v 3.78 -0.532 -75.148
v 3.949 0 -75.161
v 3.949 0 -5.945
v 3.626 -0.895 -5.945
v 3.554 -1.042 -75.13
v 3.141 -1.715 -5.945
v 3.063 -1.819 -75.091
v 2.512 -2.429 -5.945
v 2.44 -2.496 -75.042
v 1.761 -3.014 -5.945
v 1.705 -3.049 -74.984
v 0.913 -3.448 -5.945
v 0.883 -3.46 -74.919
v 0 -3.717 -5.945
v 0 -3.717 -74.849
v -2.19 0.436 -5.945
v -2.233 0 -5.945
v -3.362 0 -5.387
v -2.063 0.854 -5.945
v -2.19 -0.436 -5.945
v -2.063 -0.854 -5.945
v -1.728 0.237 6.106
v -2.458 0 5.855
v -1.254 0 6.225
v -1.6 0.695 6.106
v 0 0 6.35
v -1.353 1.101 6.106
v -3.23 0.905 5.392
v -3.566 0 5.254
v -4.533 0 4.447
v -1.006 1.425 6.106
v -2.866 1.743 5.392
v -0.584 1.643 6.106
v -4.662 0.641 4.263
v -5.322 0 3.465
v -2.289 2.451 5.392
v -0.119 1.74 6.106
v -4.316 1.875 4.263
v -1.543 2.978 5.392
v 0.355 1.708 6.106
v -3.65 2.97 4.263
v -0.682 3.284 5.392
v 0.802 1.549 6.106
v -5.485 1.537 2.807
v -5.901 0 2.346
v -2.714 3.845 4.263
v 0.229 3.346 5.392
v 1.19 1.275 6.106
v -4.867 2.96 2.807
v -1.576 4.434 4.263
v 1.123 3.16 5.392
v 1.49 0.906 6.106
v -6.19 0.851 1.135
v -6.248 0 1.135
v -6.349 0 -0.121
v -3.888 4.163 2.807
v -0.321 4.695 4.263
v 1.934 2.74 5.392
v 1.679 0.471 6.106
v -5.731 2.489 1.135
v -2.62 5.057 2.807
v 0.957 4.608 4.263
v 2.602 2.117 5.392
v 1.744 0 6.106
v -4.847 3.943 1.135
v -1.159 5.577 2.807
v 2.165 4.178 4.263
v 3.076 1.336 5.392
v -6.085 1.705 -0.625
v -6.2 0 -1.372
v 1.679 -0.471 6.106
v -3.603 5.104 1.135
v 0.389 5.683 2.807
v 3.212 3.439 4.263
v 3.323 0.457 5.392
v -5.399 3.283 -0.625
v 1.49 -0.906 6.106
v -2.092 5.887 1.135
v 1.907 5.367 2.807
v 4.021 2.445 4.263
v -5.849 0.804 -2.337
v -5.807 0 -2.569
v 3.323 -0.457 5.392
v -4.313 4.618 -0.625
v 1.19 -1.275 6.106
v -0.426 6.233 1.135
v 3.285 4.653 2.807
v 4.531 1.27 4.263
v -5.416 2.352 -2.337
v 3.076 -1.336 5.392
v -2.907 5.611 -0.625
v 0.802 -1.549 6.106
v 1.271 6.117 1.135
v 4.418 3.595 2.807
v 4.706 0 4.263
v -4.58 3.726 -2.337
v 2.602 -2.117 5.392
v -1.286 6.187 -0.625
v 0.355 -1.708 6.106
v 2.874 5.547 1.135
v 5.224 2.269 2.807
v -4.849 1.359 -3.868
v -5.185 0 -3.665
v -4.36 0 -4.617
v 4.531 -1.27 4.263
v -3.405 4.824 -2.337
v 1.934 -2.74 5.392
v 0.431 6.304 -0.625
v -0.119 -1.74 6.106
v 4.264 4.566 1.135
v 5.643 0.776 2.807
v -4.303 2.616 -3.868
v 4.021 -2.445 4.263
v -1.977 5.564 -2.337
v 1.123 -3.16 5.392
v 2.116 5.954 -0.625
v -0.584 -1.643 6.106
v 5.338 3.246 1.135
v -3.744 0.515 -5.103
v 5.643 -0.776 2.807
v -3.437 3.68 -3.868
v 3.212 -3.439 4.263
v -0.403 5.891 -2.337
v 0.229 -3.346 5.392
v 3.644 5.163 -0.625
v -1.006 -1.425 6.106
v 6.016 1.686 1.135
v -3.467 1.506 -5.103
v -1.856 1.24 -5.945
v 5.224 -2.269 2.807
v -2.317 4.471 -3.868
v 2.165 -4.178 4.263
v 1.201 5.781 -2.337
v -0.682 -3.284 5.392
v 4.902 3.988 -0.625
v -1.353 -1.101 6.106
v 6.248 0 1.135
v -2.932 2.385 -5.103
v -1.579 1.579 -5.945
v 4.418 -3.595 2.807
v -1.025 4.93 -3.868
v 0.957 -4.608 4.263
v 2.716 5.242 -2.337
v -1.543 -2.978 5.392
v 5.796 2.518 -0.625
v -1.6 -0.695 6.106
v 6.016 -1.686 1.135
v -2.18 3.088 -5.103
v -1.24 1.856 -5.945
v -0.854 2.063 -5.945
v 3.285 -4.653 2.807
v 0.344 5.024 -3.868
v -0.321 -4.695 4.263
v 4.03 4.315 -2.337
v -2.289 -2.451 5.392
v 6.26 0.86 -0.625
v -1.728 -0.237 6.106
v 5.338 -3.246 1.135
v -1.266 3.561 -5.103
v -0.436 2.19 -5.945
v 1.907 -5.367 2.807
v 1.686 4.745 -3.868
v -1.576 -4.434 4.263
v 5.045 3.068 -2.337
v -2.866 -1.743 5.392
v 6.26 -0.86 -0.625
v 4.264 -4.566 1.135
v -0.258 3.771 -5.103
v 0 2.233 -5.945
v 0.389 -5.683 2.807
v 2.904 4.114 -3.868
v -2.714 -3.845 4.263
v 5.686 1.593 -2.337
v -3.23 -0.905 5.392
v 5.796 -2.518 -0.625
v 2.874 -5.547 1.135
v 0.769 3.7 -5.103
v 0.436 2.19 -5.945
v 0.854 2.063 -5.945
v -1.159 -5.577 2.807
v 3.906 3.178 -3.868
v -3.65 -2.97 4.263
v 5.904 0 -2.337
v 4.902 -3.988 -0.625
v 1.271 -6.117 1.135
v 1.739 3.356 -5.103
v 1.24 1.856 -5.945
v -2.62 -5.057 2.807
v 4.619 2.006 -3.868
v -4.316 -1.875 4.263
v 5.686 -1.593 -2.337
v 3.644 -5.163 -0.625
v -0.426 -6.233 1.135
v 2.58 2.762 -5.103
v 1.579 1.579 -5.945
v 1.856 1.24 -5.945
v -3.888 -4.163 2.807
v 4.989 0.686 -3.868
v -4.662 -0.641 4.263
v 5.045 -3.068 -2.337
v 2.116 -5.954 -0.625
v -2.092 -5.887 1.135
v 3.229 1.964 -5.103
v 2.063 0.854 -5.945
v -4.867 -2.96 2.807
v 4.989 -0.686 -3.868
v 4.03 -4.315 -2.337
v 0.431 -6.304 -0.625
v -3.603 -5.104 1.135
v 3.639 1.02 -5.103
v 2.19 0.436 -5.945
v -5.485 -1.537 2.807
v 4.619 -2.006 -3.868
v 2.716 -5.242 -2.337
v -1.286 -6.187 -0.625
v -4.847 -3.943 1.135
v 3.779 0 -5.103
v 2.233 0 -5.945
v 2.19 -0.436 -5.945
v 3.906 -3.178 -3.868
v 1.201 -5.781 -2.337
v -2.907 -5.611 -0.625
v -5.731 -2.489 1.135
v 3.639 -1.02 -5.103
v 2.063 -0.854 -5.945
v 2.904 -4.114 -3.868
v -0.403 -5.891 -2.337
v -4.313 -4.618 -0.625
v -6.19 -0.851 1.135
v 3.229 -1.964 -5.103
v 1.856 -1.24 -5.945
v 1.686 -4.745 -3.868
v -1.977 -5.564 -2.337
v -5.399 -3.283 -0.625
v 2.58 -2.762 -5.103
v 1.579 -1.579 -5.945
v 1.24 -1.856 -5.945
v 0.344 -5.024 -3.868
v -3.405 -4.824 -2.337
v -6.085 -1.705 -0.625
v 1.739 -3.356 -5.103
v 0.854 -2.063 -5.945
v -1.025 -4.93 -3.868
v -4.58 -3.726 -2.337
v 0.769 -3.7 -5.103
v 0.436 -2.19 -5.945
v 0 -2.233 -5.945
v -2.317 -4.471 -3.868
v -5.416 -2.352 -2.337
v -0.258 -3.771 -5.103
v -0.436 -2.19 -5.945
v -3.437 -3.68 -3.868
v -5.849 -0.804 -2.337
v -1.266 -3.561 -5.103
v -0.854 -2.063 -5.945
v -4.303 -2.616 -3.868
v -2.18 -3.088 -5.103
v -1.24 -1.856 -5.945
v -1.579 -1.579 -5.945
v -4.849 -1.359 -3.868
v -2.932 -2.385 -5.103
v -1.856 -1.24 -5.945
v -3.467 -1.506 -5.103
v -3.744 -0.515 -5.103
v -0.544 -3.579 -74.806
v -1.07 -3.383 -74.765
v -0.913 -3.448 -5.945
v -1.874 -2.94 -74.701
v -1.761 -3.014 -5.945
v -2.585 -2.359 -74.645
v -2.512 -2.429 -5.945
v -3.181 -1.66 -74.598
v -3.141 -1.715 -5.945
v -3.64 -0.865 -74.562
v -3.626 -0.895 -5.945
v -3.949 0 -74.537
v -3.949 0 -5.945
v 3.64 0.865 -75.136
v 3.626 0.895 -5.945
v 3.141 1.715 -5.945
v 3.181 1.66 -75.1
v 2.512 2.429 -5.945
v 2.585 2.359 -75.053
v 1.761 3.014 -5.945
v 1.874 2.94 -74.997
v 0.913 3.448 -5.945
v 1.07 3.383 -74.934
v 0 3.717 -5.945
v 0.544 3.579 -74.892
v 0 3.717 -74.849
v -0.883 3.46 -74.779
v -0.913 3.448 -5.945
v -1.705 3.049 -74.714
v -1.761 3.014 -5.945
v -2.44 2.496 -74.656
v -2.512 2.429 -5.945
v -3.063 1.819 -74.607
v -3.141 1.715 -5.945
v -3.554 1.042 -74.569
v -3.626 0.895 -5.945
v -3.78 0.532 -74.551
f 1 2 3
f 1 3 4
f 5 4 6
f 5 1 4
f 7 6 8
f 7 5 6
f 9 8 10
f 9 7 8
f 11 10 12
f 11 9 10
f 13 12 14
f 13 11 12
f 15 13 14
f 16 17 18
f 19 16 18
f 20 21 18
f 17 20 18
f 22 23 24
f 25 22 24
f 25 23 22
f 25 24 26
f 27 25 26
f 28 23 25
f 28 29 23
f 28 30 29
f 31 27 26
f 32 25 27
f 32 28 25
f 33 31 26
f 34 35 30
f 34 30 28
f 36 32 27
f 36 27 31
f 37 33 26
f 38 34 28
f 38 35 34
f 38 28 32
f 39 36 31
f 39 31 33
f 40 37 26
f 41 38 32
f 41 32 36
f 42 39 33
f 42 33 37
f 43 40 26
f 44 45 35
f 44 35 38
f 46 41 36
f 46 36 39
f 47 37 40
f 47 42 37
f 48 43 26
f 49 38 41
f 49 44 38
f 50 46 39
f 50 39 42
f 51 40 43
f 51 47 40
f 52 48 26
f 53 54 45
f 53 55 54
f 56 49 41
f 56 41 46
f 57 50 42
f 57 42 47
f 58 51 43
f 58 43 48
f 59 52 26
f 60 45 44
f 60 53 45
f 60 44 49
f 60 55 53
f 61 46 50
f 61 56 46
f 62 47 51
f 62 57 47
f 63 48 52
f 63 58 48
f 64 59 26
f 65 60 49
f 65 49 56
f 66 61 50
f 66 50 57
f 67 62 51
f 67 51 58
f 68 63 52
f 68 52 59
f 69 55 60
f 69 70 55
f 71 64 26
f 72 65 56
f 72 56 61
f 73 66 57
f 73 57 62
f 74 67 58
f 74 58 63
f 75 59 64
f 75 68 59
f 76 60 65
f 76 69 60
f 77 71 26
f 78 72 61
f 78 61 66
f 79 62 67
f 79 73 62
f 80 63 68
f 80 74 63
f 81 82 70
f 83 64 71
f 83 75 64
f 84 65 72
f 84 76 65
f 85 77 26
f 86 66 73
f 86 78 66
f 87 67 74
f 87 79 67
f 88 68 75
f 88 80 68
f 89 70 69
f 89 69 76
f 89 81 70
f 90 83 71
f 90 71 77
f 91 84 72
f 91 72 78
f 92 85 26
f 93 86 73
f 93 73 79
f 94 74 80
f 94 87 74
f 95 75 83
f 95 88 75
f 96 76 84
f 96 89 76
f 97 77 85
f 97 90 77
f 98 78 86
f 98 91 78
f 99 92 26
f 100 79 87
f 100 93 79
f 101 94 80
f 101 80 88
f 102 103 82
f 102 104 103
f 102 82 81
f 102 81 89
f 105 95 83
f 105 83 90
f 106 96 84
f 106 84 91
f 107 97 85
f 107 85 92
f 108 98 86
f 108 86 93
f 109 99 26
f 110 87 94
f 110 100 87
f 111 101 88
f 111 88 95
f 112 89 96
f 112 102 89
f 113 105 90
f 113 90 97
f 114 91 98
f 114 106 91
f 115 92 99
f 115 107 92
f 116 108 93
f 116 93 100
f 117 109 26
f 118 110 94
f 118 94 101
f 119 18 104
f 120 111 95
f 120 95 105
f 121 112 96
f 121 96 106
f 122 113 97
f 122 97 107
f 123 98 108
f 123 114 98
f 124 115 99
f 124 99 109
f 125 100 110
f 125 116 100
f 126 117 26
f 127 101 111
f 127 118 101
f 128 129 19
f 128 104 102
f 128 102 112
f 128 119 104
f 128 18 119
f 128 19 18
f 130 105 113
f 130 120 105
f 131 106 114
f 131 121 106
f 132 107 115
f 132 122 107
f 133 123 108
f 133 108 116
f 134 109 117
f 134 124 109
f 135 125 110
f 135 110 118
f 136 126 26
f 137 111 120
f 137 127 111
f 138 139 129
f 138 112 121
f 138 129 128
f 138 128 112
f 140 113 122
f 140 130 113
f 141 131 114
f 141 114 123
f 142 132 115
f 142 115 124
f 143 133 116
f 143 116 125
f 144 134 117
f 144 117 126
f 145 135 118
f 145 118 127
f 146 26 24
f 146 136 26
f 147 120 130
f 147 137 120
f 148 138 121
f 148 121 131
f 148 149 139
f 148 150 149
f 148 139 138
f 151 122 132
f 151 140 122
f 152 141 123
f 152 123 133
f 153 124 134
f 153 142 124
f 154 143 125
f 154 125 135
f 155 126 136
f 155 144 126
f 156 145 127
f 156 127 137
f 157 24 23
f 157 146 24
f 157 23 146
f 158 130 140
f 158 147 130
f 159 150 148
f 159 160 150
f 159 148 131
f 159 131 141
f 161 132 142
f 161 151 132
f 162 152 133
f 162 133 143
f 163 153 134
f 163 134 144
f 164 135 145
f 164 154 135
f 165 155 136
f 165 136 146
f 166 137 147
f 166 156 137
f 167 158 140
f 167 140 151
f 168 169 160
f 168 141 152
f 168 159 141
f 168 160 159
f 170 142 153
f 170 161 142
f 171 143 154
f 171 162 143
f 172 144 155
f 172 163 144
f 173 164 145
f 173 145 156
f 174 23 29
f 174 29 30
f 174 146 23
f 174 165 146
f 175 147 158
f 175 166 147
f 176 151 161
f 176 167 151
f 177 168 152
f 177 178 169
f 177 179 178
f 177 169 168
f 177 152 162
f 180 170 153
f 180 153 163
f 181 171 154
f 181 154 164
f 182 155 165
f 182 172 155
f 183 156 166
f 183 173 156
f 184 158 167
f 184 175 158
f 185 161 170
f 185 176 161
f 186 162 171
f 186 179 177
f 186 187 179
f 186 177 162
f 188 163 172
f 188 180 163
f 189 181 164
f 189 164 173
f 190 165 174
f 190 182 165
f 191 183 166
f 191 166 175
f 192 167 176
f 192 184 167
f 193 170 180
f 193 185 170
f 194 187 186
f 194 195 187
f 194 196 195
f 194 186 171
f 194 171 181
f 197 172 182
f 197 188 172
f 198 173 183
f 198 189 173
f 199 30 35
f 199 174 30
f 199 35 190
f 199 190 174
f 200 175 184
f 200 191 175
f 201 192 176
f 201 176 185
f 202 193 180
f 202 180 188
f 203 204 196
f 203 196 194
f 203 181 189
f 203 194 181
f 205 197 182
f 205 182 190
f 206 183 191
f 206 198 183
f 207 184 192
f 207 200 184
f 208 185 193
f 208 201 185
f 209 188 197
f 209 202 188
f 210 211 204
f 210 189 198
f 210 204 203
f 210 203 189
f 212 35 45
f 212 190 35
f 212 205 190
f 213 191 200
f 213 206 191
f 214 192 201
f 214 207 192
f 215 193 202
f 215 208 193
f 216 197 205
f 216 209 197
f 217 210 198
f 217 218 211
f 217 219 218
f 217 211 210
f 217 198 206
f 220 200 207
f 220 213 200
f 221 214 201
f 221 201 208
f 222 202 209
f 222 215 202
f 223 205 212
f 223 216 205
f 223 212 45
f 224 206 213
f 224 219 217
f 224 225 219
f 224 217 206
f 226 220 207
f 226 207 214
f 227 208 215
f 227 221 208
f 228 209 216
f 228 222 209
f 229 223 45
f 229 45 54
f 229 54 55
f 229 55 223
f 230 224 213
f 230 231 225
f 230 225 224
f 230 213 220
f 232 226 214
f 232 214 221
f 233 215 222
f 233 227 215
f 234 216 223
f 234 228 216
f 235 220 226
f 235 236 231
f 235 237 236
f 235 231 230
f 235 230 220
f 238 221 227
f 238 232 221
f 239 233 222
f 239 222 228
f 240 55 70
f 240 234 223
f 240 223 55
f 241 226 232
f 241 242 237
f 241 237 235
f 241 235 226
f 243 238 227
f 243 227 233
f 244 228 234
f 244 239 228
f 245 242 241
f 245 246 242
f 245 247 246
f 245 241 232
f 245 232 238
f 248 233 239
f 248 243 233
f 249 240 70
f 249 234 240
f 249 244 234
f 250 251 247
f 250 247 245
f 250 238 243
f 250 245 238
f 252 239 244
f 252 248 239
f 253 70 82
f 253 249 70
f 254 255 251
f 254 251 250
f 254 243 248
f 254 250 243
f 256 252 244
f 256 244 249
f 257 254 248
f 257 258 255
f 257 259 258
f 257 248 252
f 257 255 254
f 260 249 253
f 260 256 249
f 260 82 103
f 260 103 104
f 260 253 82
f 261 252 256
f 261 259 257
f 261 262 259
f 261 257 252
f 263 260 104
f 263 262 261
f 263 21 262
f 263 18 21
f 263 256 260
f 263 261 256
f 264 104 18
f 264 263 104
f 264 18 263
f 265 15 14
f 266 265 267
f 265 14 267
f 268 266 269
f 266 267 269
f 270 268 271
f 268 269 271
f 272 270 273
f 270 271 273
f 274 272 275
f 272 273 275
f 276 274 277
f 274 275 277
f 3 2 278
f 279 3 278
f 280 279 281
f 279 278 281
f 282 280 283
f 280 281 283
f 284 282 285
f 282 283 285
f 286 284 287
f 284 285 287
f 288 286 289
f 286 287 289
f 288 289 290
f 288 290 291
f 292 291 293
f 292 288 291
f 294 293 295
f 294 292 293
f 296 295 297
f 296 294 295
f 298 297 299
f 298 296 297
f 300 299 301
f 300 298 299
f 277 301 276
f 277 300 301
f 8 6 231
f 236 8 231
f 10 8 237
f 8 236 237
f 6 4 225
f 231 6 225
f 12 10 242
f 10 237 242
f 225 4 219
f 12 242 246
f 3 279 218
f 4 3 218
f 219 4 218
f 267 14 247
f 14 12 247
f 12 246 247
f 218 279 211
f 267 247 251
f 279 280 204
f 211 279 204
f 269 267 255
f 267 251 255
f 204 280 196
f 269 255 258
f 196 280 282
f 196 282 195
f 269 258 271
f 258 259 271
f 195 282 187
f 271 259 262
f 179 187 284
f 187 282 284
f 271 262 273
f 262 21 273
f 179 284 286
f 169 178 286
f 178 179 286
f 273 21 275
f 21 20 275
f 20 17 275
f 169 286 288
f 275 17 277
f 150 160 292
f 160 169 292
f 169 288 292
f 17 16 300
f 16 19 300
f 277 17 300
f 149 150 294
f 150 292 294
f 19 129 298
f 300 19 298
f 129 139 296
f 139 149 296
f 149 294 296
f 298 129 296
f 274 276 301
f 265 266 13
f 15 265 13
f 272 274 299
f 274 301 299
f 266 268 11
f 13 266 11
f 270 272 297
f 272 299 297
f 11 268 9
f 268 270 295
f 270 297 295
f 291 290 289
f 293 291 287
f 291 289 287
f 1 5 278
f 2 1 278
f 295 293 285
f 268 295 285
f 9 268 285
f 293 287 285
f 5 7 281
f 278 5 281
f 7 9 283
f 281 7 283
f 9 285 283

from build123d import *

# Parameters (mm, degrees)
F3_DEPTH      = 3.81
F3_DEPTH_BACK = 3.81
F4_T4_DEPTH   = 81.9290237066
F4_T9_DEPTH   = 81.9290237066
F4_T14_DEPTH  = 81.28
F4_T19_DEPTH  = 81.28


# Not quite as in the source:
# - a fillet or chamfer that OpenCascade refuses, or shapes differently, is made with other operations: its cross-section is extruded or revolved along the edge and cut away or added


with BuildPart() as f1:
    # F0 (on Front) → F1 (revolve)
    with BuildSketch(Plane.XZ):
        with BuildLine():
            Line((0, -6.35), (0, 6.35))
            ThreePointArc((0, 6.35), (-6.35, 0), (0, -6.35))
        make_face()
    revolve(axis=Axis((0, 0, 0), (0, 0, -1)))

    # F2 (on Front) → F3 (join, two sides)
    with BuildSketch(Plane.XZ) as f3_sk:
        Polygon((4.1104733182, -5.9445748625), (-4.1104737839, -5.9445748625), (-4.1104737839, -74.5245748625), (4.1104733182, -75.1735985691), align=None)
    extrude(amount=-F3_DEPTH)
    extrude(f3_sk.sketch, amount=F3_DEPTH_BACK)

    # F4: fillet of radius 5.08 on 4 edges, made by hand


with BuildPart() as f4_tool2:
    # F4_s3 → F4_t4 (new body)
    with BuildSketch(Plane.XY.offset(-87.8735985691)):
        with BuildLine():
            ThreePointArc((4.1104733182, 1.27), (2.6225757666, -2.3221024484), (-0.9695266818, -3.81))
            Line((-0.9695266818, -3.81), (-0.9695266818, -3.9116))
            Line((-0.9695266818, -3.9116), (4.2120733182, -3.9116))
            Line((4.2120733182, -3.9116), (4.2120733182, 1.27))
            Line((4.2120733182, 1.27), (4.1104733182, 1.27))
        make_face()
    extrude(amount=F4_T4_DEPTH)

    split(bisect_by=Plane(origin=(-5.8725507458, 0, -74.3854631875), x_dir=(0, 1, 0), z_dir=(0.0787026743, 0, 0.9968981337)), keep=Keep.TOP)


with BuildPart() as f1_1:
    add(f1.part)

    # F4_t1: cut F4_tool2
    add(f4_tool2.part, mode=Mode.SUBTRACT)


with BuildPart() as f4_tool7:
    # F4_s8 → F4_t9 (new body)
    with BuildSketch(Plane.XY.offset(-87.8735985691)):
        with BuildLine():
            ThreePointArc((4.1104733182, -1.27), (2.6225757666, 2.3221024484), (-0.9695266818, 3.81))
            Line((-0.9695266818, 3.81), (-0.9695266818, 3.9116))
            Line((-0.9695266818, 3.9116), (4.2120733182, 3.9116))
            Line((4.2120733182, 3.9116), (4.2120733182, -1.27))
            Line((4.2120733182, -1.27), (4.1104733182, -1.27))
        make_face()
    extrude(amount=F4_T9_DEPTH)

    split(bisect_by=Plane(origin=(-5.8725507458, 0, -74.3854631875), x_dir=(0, 1, 0), z_dir=(0.0787026743, 0, 0.9968981337)), keep=Keep.TOP)


with BuildPart() as f1_2:
    add(f1_1.part)

    # F4_t6: cut F4_tool7
    add(f4_tool7.part, mode=Mode.SUBTRACT)


with BuildPart() as f4_tool12:
    # F4_s13 → F4_t14 (new body)
    with BuildSketch(Plane.XY.offset(-5.9445748625)):
        with BuildLine():
            ThreePointArc((0.9695262161, -3.81), (-2.6225762323, -2.3221024484), (-4.1104737839, 1.27))
            Line((-4.1104737839, 1.27), (-4.2120737839, 1.27))
            Line((-4.2120737839, 1.27), (-4.2120737839, -3.9116))
            Line((-4.2120737839, -3.9116), (0.9695262161, -3.9116))
            Line((0.9695262161, -3.9116), (0.9695262161, -3.81))
        make_face()
    extrude(amount=-F4_T14_DEPTH)

    split(bisect_by=Plane(origin=(-5.8725507458, 0, -74.3854631875), x_dir=(0, 1, 0), z_dir=(0.0787026743, 0, 0.9968981337)), keep=Keep.TOP)


with BuildPart() as f1_3:
    add(f1_2.part)

    # F4_t11: cut F4_tool12
    add(f4_tool12.part, mode=Mode.SUBTRACT)


with BuildPart() as f4_tool17:
    # F4_s18 → F4_t19 (new body)
    with BuildSketch(Plane.XY.offset(-5.9445748625)):
        with BuildLine():
            ThreePointArc((0.9695262161, 3.81), (-2.6225762323, 2.3221024484), (-4.1104737839, -1.27))
            Line((-4.1104737839, -1.27), (-4.2120737839, -1.27))
            Line((-4.2120737839, -1.27), (-4.2120737839, 3.9116))
            Line((-4.2120737839, 3.9116), (0.9695262161, 3.9116))
            Line((0.9695262161, 3.9116), (0.9695262161, 3.81))
        make_face()
    extrude(amount=-F4_T19_DEPTH)

    split(bisect_by=Plane(origin=(-5.8725507458, 0, -74.3854631875), x_dir=(0, 1, 0), z_dir=(0.0787026743, 0, 0.9968981337)), keep=Keep.TOP)


with BuildPart() as f1_4:
    add(f1_3.part)

    # F4_t16: cut F4_tool17
    add(f4_tool17.part, mode=Mode.SUBTRACT)


solid = f1_4.part
